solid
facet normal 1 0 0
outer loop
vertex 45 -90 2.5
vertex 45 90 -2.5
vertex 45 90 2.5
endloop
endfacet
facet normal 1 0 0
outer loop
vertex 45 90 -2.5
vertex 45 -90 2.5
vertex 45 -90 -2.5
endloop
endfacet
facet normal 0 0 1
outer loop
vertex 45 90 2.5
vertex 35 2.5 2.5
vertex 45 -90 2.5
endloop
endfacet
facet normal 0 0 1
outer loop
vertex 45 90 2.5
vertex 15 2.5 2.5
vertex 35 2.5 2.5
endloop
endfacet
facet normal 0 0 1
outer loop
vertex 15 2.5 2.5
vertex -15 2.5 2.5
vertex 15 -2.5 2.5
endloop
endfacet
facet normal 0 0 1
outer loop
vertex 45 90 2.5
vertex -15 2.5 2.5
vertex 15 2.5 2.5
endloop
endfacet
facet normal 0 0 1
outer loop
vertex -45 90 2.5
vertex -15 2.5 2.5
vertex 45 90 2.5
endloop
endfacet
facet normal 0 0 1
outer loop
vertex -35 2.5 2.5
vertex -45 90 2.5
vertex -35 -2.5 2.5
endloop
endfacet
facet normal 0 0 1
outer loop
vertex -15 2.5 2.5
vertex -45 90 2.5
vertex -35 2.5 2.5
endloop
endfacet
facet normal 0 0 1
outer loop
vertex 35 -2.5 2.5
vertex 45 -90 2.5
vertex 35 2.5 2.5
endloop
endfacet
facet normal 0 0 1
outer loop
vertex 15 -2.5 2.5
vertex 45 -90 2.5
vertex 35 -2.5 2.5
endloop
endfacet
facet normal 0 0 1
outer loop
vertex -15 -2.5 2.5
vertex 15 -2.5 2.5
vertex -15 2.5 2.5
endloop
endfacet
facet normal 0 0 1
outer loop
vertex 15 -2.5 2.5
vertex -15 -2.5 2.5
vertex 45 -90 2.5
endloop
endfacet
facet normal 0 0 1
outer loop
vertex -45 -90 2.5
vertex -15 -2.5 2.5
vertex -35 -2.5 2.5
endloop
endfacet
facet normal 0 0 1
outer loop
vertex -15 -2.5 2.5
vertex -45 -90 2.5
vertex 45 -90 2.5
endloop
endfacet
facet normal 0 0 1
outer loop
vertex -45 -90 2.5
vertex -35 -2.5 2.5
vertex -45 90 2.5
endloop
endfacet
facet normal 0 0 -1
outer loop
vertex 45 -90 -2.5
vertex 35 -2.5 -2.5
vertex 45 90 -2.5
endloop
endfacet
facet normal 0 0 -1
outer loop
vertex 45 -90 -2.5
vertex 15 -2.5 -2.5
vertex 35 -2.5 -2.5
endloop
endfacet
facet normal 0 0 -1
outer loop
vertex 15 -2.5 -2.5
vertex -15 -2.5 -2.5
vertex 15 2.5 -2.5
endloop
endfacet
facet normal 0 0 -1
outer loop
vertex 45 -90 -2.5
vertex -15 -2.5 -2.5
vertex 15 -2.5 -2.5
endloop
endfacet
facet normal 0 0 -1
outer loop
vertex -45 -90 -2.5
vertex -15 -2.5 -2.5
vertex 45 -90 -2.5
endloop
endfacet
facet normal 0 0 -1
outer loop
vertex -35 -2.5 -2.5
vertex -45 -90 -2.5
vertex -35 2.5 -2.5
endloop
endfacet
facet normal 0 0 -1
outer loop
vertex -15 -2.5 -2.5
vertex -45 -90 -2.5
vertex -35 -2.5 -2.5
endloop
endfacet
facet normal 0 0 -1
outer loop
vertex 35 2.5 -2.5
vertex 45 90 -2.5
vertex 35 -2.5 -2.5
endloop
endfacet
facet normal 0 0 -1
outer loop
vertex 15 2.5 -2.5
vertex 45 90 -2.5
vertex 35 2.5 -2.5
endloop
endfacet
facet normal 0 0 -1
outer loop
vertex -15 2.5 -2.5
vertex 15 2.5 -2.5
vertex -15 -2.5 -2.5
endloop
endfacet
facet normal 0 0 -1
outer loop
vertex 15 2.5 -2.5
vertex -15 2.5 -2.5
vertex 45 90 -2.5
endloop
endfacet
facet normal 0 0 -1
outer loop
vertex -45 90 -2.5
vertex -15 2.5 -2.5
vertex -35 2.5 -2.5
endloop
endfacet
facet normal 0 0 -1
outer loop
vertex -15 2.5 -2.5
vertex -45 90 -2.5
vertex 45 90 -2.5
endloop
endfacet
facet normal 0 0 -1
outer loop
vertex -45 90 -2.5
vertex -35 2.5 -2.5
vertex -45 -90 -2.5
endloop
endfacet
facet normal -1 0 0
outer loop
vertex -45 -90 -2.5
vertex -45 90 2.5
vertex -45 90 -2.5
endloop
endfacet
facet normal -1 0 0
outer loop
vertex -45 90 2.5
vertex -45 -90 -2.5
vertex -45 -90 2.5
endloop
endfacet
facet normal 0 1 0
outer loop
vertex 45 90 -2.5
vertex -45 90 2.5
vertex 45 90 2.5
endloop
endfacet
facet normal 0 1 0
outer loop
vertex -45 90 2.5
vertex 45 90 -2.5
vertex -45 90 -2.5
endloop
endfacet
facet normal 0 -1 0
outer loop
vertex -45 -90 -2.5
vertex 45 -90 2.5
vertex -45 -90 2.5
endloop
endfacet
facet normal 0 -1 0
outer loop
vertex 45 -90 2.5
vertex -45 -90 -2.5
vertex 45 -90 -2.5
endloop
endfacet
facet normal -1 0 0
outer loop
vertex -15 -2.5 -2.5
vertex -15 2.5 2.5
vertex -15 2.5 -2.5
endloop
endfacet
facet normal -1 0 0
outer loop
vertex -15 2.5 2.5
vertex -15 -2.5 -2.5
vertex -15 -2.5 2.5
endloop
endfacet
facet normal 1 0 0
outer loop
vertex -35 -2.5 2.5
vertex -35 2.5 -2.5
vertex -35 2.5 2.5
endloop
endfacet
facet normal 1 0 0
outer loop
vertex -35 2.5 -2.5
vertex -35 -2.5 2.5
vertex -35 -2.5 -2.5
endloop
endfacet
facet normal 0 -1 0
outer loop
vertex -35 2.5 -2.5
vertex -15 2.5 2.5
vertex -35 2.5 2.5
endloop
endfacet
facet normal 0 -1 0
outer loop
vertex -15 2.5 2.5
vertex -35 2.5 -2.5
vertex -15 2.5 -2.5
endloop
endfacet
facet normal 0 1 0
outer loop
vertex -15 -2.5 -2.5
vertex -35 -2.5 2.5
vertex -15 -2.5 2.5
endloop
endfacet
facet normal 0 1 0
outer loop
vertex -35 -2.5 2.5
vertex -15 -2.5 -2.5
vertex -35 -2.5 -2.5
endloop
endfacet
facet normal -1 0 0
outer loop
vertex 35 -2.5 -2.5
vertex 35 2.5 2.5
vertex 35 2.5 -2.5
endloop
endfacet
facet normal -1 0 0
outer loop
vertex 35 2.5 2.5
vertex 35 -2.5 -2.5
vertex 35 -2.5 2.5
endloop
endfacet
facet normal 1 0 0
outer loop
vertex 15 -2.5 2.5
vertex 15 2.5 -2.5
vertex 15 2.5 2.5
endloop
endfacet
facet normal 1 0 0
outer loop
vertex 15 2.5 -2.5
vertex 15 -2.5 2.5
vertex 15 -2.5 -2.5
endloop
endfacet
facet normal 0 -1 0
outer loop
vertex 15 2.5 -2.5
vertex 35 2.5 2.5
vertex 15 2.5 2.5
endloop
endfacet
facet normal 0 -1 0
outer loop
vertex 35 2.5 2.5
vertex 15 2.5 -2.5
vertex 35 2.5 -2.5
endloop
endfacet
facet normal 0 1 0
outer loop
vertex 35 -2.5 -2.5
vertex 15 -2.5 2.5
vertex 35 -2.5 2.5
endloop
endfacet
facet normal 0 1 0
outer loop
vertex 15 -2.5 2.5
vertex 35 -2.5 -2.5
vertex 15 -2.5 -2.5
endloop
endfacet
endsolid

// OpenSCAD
// ========================================
// a 90 x 180 x 5 mm plate with two 20 x 5 mm slots
// NeuroCAD canonical IR; dimensions are millimetres
// ========================================
$fn = 48;

difference() {
  cube(size=[90, 180, 5], center=true);
  translate([-25, 0, 0]) {
    cube(size=[20, 5, 7], center=true);
  }
  translate([25, 0, 0]) {
    cube(size=[20, 5, 7], center=true);
  }
}
